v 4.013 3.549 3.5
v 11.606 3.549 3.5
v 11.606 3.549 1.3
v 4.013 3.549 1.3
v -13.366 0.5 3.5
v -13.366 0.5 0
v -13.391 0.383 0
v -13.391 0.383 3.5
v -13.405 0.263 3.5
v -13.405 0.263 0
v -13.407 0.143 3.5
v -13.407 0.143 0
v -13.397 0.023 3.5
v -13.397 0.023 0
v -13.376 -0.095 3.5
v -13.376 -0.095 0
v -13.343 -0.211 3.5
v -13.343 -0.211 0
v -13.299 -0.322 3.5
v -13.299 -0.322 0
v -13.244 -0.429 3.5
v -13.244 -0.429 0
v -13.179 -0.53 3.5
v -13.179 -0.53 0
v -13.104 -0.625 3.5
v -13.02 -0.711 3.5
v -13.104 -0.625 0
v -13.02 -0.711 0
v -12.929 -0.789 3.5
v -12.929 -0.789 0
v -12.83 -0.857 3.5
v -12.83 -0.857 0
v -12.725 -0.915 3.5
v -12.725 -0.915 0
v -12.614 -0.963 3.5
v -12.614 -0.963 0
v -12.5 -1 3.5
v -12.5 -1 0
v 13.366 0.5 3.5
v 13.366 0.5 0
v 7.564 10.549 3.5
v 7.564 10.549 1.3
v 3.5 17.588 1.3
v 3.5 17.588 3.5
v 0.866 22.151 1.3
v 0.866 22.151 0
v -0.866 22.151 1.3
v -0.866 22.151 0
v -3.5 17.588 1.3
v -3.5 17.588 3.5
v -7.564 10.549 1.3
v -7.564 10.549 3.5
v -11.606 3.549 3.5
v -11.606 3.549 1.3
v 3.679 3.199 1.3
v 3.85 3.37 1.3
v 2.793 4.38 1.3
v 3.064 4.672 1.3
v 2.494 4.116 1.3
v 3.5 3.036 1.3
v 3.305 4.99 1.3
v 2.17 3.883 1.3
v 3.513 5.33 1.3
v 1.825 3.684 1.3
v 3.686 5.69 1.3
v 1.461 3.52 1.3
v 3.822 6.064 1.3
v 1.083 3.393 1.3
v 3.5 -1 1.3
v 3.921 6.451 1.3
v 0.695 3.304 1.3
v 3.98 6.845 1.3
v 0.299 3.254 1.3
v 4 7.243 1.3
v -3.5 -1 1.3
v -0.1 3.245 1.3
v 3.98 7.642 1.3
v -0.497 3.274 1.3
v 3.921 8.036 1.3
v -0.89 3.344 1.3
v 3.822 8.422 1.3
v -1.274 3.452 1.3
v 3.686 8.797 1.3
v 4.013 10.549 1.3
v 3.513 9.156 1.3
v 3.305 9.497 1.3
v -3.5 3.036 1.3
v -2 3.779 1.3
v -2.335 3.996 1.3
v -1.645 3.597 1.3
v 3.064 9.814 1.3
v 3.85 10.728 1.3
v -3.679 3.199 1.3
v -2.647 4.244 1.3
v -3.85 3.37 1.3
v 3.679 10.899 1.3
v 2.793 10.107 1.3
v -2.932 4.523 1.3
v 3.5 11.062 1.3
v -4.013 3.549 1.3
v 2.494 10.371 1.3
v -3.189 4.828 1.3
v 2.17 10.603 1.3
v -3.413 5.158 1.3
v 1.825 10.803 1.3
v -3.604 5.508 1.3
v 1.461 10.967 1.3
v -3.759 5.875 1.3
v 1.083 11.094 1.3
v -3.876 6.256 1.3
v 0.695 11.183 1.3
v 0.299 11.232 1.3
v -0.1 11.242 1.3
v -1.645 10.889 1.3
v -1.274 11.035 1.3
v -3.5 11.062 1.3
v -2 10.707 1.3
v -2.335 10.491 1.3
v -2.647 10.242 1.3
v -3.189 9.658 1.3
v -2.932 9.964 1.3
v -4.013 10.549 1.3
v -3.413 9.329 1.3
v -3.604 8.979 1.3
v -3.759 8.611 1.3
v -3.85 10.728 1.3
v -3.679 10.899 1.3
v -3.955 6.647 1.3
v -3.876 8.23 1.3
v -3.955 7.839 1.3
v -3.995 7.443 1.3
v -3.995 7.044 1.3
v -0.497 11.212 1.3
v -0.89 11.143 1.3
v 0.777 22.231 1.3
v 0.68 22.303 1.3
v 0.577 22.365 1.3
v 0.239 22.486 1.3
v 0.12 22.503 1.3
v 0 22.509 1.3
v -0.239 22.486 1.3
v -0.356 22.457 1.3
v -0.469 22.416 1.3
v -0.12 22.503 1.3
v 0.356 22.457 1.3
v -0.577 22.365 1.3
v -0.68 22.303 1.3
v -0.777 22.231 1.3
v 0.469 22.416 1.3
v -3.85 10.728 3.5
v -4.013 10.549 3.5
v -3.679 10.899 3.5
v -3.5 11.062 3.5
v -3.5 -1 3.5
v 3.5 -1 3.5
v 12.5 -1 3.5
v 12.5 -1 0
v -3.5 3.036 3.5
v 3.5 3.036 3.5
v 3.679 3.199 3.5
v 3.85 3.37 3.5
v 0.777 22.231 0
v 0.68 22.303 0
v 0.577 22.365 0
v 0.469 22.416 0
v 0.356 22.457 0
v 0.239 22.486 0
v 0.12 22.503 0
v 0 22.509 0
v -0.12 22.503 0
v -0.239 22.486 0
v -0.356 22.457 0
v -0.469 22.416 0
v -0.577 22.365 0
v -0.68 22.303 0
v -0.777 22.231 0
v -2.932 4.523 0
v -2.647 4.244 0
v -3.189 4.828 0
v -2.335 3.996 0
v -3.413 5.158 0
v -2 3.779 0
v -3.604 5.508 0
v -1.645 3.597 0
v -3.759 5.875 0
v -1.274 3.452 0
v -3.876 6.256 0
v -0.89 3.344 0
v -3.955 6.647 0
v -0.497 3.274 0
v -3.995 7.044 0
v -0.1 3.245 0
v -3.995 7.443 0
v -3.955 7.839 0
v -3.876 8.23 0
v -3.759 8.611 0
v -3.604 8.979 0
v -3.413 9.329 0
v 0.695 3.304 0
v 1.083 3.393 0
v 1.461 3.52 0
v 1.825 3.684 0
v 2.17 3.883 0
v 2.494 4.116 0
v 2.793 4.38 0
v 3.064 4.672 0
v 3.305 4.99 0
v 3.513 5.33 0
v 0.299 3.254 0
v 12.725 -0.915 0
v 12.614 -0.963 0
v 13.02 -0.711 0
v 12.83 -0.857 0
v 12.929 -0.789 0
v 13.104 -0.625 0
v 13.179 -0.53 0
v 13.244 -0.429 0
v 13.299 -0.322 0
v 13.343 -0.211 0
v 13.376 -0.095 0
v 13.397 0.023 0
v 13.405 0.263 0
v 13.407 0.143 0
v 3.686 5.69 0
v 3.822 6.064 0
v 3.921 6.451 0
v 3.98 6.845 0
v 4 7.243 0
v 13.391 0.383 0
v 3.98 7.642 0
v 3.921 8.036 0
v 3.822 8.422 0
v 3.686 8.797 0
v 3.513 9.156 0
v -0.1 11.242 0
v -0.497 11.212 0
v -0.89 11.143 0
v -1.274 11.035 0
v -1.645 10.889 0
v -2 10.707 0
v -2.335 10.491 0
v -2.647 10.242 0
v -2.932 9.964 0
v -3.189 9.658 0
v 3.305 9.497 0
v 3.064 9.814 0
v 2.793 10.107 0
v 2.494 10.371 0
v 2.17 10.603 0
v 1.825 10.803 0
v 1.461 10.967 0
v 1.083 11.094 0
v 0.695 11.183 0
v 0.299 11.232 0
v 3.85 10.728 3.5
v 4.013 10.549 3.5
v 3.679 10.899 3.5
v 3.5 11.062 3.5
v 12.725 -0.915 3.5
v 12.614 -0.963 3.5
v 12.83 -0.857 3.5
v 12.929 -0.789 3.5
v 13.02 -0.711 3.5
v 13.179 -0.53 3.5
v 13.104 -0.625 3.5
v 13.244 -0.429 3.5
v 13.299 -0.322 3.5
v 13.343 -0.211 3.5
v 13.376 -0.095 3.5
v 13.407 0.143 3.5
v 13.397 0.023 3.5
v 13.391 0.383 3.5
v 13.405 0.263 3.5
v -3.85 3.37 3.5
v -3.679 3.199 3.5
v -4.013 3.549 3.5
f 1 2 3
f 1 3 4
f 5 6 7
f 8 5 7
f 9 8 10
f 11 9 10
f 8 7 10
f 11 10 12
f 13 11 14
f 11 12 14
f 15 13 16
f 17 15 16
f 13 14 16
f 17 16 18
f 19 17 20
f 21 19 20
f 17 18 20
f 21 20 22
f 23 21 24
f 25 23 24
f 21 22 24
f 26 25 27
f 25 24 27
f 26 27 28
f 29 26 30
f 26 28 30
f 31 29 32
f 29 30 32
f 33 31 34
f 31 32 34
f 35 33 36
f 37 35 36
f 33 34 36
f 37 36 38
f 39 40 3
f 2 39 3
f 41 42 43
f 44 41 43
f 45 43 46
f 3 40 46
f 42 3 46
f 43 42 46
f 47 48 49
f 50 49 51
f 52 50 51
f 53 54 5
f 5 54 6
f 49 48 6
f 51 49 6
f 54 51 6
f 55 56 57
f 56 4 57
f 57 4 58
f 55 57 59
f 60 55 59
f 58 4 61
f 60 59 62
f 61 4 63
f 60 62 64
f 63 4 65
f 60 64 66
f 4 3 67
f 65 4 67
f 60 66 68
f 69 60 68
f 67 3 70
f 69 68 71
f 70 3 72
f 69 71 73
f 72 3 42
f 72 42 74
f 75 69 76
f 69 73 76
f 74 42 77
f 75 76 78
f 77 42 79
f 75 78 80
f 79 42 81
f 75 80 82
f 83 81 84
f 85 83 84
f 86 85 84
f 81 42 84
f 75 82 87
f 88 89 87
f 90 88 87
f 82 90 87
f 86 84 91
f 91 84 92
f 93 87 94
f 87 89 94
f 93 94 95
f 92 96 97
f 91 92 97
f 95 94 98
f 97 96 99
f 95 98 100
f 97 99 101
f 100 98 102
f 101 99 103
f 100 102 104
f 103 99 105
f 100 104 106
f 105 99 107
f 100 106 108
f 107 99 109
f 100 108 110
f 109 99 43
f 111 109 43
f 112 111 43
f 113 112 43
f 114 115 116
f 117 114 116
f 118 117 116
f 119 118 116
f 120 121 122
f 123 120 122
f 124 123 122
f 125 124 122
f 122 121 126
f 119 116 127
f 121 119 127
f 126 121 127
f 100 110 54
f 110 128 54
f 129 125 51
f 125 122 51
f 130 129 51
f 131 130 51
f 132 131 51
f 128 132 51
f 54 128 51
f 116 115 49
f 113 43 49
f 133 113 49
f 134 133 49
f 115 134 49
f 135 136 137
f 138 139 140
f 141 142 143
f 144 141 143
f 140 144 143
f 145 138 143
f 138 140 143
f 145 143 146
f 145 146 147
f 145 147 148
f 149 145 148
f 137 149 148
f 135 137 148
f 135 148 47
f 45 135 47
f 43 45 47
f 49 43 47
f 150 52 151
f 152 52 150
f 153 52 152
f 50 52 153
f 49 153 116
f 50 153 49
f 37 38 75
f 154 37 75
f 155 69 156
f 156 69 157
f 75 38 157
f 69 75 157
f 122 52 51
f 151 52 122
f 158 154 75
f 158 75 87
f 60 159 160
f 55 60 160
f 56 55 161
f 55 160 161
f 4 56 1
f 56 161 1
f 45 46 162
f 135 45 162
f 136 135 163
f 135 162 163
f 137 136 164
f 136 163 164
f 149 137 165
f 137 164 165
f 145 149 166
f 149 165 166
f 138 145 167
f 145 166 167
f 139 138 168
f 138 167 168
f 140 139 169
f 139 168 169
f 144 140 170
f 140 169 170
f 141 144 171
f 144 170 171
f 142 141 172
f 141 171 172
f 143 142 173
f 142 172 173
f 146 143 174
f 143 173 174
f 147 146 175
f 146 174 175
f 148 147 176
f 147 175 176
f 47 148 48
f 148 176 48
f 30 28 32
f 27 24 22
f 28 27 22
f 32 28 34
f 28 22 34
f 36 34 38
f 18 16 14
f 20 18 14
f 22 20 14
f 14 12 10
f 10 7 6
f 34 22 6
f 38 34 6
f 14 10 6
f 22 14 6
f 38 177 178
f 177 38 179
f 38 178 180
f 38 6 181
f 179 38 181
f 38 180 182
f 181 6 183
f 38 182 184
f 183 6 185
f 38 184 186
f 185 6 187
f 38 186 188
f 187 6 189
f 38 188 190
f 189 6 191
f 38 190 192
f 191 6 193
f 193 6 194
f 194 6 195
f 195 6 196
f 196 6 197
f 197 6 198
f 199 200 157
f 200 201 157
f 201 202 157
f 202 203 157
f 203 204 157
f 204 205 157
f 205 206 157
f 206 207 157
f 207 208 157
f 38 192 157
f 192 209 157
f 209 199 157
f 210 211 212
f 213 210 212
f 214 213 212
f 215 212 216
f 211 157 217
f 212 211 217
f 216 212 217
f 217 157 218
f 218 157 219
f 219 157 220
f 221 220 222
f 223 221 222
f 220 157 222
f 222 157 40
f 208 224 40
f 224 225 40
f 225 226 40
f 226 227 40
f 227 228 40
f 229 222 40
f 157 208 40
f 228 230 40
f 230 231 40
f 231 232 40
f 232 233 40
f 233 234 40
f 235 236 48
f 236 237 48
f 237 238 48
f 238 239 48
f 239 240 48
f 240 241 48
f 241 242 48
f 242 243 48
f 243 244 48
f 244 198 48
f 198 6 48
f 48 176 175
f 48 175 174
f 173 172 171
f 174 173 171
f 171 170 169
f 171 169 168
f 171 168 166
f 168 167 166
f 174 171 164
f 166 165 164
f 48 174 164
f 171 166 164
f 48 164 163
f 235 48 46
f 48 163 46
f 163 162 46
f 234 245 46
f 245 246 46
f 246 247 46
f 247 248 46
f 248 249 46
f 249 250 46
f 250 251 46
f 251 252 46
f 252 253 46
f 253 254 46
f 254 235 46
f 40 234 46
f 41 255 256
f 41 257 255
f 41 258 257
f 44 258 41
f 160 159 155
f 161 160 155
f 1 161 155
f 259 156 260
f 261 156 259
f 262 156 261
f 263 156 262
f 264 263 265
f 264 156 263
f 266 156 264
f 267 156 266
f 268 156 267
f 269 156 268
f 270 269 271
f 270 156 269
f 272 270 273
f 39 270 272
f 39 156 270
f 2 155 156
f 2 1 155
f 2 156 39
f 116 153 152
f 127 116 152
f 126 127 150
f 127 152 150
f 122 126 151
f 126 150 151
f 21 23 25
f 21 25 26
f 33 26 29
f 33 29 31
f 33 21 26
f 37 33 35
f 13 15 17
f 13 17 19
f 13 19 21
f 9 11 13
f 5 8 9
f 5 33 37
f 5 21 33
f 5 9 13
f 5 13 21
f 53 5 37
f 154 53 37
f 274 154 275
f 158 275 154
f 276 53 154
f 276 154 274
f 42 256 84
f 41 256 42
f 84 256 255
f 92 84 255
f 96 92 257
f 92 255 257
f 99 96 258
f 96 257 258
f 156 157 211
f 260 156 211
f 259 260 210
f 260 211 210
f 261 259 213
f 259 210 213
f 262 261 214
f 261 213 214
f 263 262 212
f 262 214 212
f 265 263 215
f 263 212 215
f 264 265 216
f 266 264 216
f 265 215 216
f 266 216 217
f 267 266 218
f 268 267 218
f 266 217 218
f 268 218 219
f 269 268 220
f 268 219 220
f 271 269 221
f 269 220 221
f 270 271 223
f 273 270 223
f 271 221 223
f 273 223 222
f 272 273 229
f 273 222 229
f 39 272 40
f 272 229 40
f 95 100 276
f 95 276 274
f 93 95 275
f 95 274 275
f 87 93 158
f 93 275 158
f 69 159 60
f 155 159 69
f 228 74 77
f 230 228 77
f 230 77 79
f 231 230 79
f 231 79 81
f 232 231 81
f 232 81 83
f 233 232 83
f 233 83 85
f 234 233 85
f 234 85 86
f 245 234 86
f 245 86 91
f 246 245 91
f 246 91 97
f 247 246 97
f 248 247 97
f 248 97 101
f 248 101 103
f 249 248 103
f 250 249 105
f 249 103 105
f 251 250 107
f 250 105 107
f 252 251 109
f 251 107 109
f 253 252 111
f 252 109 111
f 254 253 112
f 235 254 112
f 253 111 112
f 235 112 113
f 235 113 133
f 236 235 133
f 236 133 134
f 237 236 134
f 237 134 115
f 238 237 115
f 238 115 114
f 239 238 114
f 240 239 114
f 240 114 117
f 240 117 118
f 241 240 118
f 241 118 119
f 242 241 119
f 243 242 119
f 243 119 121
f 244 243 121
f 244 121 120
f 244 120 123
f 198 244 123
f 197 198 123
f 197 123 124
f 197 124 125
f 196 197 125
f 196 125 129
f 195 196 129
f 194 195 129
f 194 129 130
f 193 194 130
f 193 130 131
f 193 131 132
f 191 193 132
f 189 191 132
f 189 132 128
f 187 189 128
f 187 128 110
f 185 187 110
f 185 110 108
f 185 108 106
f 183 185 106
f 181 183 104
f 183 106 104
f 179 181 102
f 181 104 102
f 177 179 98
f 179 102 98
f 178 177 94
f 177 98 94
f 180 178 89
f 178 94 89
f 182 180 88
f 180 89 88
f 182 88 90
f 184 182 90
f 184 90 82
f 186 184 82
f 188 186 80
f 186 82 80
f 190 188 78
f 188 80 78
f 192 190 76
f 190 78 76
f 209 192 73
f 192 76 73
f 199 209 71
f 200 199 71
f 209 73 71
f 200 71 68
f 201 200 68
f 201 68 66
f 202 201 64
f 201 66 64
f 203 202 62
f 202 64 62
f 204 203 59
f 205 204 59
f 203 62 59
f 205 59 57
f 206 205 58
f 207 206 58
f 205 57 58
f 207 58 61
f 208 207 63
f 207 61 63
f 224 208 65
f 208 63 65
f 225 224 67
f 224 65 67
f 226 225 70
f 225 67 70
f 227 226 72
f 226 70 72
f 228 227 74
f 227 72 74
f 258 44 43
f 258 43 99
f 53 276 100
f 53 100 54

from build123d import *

# Parameters (mm, degrees)
EXTRUDE_1_DEPTH     = 3.5
EXTRUDE_8_DEPTH     = 3.5
SKETCH_12_R         = 4
CUT_EXTRUDE_1_DEPTH = 27.432726041
SKETCH_13_R         = 5.325
CUT_EXTRUDE_2_DEPTH = 2.2
CUT_EXTRUDE_3_DEPTH = 2.2


with BuildPart() as part:
    # ｽｹｯﾁ1 → ﾎﾞｽ - 押し出し1 (new body)
    with BuildSketch(Plane.XY):
        Polygon((0, 21.650635095), (-12.5, 0), (12.5, 0), align=None)
    extrude(amount=EXTRUDE_1_DEPTH)

    # ｽｹｯﾁ11 → ﾎﾞｽ - 押し出し8 (add, through all)
    with BuildSketch(Plane(origin=(0, 0, 0), x_dir=(-1, 0, 0), z_dir=(0, 0, -1))):
        with BuildLine():
            Line((0.866025404, 22.150635095), (13.366025404, 0.5))
            ThreePointArc((13.366025404, 0.5), (13.243672874, -0.429359734), (12.5, -1))
            Line((12.5, -1), (-12.5, -1))
            ThreePointArc((-12.5, -1), (-13.243672874, -0.429359734), (-13.366025404, 0.5))
            Line((-13.366025404, 0.5), (-0.866025404, 22.150635095))
            ThreePointArc((-0.866025404, 22.150635095), (0, 22.509354562), (0.866025404, 22.150635095))
        make_face()
        Polygon((0, 21.650635095), (12.5, 0), (-12.5, 0), align=None, mode=Mode.SUBTRACT)
    extrude(amount=-EXTRUDE_8_DEPTH)

    # ｽｹｯﾁ12 → ｶｯﾄ - 押し出し1 (cut, through all)
    with BuildSketch(Plane.XY.offset(3.5)):
        with Locations((0, 7.24327674)):
            Circle(SKETCH_12_R)
    extrude(amount=-CUT_EXTRUDE_1_DEPTH, mode=Mode.SUBTRACT)

    # ｽｹｯﾁ13 → ｶｯﾄ - 押し出し2 (cut)
    with BuildSketch(Plane.XY.offset(3.5)):
        with Locations((0, 7.048781332)):
            Circle(SKETCH_13_R)
    extrude(amount=-CUT_EXTRUDE_2_DEPTH, mode=Mode.SUBTRACT)

    # ｽｹｯﾁ14 → ｶｯﾄ - 押し出し3 (cut)
    with BuildSketch(Plane.XY.offset(3.5)):
        Polygon((-3.5, 24.86994882), (3.5, 24.86994882), (3.5, 10.548781332), (20.875633237, 10.548781332), (20.875633237, 3.548781332), (3.5, 3.548781332), (3.5, -2.871018352), (-3.5, -2.871018352), (-3.5, 3.548781332), (-19.259035821, 3.548781332), (-19.259035821, 10.548781332), (-3.5, 10.548781332), align=None)
    extrude(amount=-CUT_EXTRUDE_3_DEPTH, mode=Mode.SUBTRACT)


solid = part.part
